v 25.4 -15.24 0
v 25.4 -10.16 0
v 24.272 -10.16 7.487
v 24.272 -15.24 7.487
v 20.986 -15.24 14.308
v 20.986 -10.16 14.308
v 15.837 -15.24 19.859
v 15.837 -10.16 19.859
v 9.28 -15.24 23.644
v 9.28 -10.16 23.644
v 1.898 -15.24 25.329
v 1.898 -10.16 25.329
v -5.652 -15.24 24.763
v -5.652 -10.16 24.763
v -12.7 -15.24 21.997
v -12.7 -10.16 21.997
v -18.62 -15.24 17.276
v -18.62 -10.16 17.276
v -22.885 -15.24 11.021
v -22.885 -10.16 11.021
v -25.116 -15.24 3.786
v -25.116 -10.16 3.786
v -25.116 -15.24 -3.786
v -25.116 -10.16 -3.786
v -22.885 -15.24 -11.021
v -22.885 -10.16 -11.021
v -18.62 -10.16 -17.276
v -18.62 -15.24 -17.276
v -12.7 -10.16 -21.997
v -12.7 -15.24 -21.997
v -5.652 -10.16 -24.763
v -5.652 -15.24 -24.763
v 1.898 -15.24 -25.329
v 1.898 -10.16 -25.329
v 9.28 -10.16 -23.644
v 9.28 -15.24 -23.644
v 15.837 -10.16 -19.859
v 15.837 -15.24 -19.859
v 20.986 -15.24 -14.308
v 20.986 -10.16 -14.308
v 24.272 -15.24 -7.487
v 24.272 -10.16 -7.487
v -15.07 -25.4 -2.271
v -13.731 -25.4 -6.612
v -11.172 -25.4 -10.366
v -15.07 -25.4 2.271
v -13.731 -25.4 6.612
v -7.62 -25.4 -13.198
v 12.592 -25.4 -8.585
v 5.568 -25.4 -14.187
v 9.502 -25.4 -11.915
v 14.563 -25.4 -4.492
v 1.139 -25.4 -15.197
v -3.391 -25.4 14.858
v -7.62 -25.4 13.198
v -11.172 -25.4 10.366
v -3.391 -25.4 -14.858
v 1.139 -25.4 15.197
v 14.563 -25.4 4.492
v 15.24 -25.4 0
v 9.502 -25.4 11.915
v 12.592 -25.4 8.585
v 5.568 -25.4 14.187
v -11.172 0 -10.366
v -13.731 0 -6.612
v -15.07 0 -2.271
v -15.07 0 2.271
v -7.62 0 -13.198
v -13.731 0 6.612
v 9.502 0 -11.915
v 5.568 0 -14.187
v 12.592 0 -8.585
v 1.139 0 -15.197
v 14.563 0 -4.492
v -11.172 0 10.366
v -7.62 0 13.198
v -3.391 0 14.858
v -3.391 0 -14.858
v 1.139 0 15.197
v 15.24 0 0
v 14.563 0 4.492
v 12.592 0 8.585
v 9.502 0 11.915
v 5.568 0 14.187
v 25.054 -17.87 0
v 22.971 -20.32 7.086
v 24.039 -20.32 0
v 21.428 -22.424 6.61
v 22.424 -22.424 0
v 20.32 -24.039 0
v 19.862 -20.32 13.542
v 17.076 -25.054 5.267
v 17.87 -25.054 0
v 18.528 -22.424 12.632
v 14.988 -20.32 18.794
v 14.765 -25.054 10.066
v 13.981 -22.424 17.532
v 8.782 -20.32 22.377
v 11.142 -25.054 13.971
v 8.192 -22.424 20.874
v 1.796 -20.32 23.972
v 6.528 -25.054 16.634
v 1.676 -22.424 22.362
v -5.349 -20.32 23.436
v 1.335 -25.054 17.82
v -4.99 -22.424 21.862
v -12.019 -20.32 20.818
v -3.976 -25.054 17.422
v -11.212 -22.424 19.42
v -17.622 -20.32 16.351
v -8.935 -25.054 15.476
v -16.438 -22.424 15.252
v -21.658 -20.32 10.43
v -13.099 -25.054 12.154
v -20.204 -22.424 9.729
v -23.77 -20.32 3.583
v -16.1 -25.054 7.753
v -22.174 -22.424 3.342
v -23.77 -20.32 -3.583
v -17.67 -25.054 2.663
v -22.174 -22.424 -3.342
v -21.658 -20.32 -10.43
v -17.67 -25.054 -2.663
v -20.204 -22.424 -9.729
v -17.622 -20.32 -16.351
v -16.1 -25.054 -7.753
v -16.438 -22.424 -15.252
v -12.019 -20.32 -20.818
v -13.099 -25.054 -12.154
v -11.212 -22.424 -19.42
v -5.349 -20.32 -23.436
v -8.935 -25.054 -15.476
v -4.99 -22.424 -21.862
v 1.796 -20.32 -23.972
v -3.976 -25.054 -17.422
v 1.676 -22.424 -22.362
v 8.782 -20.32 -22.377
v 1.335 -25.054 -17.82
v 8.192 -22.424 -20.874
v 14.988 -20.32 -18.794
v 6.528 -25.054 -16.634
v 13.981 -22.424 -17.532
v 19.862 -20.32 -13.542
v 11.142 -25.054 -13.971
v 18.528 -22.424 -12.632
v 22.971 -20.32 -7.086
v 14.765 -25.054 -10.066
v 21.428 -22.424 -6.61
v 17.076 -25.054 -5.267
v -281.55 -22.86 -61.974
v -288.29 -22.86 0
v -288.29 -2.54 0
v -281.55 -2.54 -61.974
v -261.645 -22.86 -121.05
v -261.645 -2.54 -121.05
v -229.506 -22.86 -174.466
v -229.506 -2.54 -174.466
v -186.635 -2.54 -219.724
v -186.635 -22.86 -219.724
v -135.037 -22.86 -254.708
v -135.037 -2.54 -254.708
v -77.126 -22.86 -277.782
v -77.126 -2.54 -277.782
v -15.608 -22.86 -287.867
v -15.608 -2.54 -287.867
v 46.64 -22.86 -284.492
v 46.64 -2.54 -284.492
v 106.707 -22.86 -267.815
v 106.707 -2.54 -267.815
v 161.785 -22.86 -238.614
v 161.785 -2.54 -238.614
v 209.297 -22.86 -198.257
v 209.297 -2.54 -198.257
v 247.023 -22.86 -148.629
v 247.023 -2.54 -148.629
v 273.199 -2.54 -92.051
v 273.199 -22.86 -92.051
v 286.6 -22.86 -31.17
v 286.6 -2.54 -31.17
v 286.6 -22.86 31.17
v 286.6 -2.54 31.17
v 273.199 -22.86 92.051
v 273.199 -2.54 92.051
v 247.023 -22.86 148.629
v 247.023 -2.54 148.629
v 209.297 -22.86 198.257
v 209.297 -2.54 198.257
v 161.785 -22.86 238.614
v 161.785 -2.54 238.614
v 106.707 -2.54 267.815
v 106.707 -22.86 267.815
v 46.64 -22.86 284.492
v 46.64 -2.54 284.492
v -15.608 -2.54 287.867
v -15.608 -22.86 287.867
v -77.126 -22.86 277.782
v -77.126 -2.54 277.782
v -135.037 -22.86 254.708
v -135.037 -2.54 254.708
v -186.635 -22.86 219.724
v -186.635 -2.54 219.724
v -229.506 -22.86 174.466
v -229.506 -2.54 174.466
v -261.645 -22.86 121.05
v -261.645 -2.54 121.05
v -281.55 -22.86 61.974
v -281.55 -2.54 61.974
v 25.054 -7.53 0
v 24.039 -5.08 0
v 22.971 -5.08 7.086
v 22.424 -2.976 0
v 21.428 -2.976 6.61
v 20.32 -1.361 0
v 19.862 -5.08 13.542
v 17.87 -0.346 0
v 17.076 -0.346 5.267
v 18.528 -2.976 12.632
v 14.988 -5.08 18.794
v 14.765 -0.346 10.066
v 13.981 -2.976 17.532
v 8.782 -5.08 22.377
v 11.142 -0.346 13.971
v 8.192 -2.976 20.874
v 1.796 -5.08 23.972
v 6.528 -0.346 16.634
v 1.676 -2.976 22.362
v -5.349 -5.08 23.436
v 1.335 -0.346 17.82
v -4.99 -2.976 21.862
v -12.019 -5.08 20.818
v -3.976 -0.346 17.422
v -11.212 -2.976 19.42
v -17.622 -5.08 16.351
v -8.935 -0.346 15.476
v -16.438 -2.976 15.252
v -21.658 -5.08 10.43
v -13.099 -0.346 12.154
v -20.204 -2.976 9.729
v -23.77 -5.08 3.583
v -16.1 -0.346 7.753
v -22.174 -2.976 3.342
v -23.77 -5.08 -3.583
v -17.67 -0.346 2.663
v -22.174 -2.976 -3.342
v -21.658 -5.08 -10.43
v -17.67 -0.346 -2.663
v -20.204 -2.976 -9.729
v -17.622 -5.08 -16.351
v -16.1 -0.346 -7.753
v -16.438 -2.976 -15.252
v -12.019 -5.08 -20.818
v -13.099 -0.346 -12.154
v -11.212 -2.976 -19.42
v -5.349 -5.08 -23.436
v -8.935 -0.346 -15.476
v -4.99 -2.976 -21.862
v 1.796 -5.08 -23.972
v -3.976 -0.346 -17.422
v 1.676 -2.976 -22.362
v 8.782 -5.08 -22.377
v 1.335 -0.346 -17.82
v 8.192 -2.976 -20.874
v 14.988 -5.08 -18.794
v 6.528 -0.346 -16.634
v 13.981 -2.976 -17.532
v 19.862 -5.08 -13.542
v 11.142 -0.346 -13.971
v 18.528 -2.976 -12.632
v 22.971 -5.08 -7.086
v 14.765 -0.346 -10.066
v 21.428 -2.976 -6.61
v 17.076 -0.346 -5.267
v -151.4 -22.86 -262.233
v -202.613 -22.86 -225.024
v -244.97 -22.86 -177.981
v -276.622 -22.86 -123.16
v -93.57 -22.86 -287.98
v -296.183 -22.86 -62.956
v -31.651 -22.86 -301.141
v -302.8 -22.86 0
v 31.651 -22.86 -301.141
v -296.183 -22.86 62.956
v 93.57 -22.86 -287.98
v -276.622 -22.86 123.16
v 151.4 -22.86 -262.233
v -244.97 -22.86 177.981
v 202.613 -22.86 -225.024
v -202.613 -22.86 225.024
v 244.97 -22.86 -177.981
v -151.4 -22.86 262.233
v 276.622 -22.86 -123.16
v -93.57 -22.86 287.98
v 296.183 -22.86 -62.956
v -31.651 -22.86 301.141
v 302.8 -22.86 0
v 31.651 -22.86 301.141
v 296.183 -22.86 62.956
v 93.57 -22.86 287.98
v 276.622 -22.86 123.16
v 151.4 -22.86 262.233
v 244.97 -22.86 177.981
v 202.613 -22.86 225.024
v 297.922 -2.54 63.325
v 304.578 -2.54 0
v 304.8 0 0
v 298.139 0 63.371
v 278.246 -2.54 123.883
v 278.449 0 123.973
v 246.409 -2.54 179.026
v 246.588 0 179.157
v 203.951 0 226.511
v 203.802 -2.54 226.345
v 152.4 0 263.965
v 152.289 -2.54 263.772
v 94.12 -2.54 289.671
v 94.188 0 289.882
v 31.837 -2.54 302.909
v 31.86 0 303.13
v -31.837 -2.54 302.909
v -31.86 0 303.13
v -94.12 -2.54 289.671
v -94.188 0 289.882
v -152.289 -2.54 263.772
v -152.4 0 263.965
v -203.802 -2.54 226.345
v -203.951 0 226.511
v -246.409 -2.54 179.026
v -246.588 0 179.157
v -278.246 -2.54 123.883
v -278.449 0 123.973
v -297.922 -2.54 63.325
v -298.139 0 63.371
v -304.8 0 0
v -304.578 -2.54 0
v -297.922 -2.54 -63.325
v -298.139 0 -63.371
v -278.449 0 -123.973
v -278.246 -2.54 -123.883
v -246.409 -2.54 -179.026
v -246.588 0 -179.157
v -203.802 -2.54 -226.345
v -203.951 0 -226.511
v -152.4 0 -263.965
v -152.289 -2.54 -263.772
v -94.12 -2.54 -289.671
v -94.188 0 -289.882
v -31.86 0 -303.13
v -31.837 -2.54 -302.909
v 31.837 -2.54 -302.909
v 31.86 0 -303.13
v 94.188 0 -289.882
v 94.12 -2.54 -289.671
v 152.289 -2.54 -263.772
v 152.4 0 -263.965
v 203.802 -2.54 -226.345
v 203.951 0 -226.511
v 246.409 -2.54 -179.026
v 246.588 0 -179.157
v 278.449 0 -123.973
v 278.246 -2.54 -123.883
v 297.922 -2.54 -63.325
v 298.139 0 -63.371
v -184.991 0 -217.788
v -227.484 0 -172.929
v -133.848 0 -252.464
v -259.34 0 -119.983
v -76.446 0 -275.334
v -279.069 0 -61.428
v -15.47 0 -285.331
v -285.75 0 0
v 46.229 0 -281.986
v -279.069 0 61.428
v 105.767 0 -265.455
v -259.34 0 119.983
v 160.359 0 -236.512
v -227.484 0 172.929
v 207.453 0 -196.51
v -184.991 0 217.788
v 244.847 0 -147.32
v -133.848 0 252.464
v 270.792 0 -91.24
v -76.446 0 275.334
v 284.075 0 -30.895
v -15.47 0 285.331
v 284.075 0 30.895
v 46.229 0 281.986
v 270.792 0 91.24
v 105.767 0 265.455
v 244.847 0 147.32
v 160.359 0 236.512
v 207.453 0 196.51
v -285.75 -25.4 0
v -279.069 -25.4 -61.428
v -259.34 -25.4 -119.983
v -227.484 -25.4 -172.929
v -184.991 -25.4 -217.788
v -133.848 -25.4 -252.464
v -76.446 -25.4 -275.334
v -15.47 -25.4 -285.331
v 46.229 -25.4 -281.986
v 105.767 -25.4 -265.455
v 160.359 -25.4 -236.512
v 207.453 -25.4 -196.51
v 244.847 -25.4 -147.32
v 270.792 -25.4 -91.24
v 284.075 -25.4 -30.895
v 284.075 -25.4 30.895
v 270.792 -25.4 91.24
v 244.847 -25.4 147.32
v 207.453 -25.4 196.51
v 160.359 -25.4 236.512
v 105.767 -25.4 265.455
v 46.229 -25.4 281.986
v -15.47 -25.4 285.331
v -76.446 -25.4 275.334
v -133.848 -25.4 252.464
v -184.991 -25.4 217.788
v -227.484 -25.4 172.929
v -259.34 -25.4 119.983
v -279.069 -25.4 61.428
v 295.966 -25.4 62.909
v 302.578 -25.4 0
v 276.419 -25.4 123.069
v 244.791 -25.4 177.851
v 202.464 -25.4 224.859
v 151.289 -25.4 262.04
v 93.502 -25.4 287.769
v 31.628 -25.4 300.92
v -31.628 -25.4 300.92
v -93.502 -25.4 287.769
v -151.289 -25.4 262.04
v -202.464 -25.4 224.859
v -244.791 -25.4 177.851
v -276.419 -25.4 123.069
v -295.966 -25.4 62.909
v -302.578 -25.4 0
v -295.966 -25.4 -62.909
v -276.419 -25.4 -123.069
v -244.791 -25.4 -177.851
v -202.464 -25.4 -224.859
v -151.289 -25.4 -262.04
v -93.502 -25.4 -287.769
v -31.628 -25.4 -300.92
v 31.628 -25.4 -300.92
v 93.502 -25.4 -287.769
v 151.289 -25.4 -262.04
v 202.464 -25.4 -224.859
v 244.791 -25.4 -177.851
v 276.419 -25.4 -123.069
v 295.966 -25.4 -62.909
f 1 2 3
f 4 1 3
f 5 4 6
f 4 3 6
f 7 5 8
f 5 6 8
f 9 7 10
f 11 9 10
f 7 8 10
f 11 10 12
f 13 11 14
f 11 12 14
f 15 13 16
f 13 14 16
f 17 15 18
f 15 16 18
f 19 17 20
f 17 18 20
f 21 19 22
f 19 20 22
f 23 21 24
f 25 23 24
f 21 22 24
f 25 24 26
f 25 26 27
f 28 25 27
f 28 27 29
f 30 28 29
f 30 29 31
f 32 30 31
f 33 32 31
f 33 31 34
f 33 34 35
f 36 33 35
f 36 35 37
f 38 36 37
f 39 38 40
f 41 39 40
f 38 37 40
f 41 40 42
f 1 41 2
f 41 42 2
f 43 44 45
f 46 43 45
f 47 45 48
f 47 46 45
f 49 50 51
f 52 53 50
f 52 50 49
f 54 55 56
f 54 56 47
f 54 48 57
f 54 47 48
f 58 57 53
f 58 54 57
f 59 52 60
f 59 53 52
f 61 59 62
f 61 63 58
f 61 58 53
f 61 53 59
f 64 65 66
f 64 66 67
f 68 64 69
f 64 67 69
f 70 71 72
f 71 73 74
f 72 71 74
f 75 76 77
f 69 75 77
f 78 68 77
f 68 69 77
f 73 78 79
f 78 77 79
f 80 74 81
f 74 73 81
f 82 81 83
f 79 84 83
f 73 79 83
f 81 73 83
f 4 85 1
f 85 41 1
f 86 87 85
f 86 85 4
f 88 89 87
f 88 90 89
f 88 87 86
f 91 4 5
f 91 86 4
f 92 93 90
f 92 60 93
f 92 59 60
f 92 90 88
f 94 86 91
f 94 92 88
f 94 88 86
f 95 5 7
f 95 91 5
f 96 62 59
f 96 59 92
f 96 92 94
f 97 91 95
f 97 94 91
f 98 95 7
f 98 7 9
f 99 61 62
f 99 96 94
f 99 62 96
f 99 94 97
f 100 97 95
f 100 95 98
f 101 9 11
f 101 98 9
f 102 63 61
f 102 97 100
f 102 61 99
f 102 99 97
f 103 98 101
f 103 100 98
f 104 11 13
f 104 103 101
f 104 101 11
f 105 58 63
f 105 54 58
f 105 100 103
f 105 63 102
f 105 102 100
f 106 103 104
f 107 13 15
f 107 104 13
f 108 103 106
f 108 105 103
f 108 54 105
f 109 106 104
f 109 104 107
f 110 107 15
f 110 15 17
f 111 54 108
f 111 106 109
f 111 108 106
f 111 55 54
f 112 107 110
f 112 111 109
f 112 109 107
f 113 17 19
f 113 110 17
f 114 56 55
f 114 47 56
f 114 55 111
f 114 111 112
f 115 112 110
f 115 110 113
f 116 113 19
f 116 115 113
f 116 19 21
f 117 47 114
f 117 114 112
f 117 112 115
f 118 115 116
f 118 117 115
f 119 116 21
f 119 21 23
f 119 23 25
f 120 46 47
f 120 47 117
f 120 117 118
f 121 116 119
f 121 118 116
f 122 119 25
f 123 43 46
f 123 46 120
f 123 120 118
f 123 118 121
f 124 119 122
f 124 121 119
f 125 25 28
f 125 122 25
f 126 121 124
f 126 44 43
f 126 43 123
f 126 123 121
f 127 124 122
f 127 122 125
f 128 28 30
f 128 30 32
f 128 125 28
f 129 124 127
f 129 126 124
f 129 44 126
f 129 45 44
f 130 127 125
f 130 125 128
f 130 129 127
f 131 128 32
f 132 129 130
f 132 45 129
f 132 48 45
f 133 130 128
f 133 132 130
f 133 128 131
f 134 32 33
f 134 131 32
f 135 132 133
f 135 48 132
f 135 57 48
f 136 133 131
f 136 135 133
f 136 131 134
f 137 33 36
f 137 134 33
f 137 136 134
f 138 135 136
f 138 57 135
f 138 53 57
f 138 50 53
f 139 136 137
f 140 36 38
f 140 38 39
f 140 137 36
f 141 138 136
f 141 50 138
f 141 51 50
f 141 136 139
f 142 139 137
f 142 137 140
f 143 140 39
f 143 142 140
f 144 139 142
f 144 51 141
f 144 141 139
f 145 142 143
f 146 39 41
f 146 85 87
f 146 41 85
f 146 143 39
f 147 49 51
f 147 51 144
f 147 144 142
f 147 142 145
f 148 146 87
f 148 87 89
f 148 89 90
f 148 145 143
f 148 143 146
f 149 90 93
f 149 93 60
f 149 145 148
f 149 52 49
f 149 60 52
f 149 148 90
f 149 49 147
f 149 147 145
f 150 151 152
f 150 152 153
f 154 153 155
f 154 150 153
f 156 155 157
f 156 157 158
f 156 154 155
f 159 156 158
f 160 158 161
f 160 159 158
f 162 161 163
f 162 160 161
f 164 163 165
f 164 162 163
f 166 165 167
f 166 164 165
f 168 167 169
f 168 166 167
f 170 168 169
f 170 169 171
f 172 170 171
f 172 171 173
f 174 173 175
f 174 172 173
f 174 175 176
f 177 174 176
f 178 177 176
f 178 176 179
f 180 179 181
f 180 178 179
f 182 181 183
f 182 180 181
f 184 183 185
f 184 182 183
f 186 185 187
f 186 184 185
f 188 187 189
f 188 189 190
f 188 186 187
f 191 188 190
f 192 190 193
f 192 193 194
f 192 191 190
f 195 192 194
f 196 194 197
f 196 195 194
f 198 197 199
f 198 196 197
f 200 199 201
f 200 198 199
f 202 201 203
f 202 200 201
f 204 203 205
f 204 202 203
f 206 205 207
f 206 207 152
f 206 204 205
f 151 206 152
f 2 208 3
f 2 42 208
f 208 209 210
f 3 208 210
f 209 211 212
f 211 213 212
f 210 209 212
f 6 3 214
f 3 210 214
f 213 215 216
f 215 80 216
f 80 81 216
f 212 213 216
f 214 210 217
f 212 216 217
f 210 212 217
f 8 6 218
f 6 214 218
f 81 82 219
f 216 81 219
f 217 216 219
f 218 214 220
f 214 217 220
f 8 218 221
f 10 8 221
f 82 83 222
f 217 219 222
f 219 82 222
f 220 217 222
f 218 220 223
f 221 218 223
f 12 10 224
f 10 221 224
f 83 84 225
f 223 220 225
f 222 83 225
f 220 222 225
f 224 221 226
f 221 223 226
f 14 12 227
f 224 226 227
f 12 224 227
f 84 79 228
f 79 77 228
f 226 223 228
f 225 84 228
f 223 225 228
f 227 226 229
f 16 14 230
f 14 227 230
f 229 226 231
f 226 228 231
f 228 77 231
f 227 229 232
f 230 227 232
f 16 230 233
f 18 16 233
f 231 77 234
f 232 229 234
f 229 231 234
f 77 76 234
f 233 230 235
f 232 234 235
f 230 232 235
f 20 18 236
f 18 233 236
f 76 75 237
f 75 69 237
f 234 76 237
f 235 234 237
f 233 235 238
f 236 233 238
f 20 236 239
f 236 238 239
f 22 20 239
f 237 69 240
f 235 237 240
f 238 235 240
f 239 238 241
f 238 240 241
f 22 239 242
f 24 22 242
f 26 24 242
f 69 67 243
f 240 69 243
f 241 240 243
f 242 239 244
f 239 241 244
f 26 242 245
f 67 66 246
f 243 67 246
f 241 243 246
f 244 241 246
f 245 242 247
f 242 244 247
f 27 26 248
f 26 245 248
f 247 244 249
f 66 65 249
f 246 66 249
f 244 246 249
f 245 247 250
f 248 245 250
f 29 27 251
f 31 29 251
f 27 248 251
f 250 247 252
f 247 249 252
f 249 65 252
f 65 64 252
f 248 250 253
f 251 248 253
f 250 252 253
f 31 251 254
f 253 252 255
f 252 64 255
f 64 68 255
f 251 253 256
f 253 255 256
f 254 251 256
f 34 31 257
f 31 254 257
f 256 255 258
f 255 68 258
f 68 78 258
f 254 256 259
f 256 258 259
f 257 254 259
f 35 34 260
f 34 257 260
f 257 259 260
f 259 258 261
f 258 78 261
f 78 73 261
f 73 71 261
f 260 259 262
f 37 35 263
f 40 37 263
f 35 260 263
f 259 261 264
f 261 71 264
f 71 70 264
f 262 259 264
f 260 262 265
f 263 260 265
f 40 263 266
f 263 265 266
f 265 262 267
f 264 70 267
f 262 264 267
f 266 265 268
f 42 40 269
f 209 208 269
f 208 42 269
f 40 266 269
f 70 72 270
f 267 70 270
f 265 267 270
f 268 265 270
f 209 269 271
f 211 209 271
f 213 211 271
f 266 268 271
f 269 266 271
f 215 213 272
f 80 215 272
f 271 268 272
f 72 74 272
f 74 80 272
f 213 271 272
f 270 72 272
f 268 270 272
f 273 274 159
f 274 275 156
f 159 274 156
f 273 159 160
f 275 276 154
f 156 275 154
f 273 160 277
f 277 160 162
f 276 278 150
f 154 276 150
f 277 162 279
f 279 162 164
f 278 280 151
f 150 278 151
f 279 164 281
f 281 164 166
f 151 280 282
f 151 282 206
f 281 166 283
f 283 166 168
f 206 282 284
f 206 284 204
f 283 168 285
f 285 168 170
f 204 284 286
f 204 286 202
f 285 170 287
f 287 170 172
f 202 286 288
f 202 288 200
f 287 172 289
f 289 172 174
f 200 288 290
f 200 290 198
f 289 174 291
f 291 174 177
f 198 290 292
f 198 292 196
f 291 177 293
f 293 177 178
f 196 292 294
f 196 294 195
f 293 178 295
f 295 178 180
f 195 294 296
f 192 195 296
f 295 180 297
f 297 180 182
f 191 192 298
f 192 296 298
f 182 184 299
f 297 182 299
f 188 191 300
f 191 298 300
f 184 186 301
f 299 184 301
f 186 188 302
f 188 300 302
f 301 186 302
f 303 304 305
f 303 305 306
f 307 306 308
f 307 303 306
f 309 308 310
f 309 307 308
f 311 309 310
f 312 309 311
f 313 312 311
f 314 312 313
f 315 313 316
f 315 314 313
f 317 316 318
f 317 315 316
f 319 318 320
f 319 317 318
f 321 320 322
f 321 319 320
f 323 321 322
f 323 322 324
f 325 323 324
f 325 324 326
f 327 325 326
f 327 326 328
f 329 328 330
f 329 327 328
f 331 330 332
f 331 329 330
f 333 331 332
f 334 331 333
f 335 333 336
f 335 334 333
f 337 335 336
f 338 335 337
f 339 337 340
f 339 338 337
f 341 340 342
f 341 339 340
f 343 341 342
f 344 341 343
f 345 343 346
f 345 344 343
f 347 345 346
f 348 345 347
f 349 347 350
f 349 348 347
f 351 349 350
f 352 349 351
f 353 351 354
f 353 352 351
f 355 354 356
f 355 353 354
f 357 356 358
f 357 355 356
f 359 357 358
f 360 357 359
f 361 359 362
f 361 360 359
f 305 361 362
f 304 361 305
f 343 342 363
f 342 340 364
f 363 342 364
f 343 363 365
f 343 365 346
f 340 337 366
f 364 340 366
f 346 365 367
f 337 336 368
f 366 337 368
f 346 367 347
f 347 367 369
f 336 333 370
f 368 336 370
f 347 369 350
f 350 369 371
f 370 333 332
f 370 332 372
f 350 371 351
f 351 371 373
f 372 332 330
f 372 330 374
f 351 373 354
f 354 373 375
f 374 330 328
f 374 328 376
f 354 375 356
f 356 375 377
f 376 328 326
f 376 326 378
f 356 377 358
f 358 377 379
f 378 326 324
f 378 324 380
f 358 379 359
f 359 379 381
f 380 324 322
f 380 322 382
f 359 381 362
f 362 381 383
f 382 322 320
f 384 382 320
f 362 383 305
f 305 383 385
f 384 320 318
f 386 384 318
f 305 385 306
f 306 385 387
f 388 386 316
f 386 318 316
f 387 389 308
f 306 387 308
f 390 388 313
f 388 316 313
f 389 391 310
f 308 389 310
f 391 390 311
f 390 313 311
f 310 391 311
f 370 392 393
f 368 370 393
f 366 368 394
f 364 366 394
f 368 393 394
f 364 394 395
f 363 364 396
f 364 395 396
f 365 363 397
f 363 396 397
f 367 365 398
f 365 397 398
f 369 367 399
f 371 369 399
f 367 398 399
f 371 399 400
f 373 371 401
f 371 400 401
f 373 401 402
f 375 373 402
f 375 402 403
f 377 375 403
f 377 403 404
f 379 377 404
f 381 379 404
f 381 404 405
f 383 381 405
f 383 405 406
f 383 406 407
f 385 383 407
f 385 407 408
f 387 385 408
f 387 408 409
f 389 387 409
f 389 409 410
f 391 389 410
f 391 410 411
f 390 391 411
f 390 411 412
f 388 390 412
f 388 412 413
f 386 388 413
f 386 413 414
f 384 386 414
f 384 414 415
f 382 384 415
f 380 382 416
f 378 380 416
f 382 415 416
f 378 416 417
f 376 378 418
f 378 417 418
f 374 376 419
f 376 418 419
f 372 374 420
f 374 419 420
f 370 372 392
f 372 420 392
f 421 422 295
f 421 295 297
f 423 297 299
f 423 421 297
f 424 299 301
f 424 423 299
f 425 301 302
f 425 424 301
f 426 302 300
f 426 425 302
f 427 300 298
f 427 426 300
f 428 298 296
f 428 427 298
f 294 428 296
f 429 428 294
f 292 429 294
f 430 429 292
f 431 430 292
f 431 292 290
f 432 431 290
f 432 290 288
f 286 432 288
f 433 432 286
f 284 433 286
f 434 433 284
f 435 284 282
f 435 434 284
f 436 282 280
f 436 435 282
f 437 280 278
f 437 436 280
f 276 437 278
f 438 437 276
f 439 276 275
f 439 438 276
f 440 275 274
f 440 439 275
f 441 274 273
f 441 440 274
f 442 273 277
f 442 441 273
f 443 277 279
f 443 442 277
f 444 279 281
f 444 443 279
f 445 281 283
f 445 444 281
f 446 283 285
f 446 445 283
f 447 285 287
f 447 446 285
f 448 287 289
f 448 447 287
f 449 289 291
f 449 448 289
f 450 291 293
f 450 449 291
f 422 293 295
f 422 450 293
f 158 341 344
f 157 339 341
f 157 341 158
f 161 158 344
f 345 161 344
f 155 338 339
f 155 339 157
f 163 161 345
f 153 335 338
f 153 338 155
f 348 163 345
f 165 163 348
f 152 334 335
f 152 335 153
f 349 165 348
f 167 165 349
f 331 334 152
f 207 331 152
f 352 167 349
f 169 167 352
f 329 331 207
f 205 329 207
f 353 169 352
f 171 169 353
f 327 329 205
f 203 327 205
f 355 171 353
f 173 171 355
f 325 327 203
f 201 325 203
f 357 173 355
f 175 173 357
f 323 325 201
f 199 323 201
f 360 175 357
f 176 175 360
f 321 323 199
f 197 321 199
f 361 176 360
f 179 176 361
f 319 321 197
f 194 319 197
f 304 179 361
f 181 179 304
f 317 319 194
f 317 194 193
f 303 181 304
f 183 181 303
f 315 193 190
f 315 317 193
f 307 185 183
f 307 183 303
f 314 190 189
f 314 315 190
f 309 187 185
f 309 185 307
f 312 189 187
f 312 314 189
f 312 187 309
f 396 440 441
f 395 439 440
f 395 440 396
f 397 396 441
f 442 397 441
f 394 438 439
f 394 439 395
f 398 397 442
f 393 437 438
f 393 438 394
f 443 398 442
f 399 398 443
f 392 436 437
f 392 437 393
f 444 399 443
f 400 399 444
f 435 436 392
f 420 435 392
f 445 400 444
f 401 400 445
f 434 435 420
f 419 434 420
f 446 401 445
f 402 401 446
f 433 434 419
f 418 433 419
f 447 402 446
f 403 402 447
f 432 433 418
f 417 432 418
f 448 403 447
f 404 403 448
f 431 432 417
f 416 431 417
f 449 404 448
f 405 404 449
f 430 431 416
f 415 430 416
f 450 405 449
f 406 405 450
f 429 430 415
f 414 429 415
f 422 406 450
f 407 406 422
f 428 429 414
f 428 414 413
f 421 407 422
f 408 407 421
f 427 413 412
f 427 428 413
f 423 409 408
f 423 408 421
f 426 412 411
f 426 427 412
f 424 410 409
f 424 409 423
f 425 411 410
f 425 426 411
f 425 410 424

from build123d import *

# Parameters (mm, degrees)
F0_R     = 304.8
F2_DEPTH = 25.4
F2_TAPER = 5
F3_D     = 571.5
F4_T     = -2.54
F5_R     = 25.4
F6_DEPTH = 25.4
F7_R     = 10.16
F8_R     = 10.16


with BuildPart() as f2:
    # F0 (on Front) → F2 (new body)
    with BuildSketch(Plane.XZ):
        Circle(F0_R)
    extrude(amount=F2_DEPTH, taper=F2_TAPER)

    # F3 (through all)
    with Locations(Plane(origin=(0, 0, 0), x_dir=(1, 0, 0), z_dir=(0, 1, 0))):
        with Locations((0, 0)):
            Hole(F3_D / 2)

    # F4
    f4_openings = [f2.faces().sort_by_distance(p)[0] for p in [
        (-303.688894, -12.7, 0),
    ]]
    offset(amount=F4_T, openings=f4_openings)


with BuildPart() as f6:
    # F5 (on face) → F6 (new body)
    with BuildSketch(Plane.XZ):
        Circle(F5_R)
    extrude(amount=F6_DEPTH)

    # F7
    f7_edges = [f6.edges().sort_by_distance(p)[0] for p in [
        (-25.4, -25.4, 0),
    ]]
    fillet(f7_edges, radius=F7_R)

    # F8
    f8_edges = [f6.edges().sort_by_distance(p)[0] for p in [
        (-25.4, 0, 0),
    ]]
    fillet(f8_edges, radius=F8_R)


solid = Compound([f2.part, f6.part])
